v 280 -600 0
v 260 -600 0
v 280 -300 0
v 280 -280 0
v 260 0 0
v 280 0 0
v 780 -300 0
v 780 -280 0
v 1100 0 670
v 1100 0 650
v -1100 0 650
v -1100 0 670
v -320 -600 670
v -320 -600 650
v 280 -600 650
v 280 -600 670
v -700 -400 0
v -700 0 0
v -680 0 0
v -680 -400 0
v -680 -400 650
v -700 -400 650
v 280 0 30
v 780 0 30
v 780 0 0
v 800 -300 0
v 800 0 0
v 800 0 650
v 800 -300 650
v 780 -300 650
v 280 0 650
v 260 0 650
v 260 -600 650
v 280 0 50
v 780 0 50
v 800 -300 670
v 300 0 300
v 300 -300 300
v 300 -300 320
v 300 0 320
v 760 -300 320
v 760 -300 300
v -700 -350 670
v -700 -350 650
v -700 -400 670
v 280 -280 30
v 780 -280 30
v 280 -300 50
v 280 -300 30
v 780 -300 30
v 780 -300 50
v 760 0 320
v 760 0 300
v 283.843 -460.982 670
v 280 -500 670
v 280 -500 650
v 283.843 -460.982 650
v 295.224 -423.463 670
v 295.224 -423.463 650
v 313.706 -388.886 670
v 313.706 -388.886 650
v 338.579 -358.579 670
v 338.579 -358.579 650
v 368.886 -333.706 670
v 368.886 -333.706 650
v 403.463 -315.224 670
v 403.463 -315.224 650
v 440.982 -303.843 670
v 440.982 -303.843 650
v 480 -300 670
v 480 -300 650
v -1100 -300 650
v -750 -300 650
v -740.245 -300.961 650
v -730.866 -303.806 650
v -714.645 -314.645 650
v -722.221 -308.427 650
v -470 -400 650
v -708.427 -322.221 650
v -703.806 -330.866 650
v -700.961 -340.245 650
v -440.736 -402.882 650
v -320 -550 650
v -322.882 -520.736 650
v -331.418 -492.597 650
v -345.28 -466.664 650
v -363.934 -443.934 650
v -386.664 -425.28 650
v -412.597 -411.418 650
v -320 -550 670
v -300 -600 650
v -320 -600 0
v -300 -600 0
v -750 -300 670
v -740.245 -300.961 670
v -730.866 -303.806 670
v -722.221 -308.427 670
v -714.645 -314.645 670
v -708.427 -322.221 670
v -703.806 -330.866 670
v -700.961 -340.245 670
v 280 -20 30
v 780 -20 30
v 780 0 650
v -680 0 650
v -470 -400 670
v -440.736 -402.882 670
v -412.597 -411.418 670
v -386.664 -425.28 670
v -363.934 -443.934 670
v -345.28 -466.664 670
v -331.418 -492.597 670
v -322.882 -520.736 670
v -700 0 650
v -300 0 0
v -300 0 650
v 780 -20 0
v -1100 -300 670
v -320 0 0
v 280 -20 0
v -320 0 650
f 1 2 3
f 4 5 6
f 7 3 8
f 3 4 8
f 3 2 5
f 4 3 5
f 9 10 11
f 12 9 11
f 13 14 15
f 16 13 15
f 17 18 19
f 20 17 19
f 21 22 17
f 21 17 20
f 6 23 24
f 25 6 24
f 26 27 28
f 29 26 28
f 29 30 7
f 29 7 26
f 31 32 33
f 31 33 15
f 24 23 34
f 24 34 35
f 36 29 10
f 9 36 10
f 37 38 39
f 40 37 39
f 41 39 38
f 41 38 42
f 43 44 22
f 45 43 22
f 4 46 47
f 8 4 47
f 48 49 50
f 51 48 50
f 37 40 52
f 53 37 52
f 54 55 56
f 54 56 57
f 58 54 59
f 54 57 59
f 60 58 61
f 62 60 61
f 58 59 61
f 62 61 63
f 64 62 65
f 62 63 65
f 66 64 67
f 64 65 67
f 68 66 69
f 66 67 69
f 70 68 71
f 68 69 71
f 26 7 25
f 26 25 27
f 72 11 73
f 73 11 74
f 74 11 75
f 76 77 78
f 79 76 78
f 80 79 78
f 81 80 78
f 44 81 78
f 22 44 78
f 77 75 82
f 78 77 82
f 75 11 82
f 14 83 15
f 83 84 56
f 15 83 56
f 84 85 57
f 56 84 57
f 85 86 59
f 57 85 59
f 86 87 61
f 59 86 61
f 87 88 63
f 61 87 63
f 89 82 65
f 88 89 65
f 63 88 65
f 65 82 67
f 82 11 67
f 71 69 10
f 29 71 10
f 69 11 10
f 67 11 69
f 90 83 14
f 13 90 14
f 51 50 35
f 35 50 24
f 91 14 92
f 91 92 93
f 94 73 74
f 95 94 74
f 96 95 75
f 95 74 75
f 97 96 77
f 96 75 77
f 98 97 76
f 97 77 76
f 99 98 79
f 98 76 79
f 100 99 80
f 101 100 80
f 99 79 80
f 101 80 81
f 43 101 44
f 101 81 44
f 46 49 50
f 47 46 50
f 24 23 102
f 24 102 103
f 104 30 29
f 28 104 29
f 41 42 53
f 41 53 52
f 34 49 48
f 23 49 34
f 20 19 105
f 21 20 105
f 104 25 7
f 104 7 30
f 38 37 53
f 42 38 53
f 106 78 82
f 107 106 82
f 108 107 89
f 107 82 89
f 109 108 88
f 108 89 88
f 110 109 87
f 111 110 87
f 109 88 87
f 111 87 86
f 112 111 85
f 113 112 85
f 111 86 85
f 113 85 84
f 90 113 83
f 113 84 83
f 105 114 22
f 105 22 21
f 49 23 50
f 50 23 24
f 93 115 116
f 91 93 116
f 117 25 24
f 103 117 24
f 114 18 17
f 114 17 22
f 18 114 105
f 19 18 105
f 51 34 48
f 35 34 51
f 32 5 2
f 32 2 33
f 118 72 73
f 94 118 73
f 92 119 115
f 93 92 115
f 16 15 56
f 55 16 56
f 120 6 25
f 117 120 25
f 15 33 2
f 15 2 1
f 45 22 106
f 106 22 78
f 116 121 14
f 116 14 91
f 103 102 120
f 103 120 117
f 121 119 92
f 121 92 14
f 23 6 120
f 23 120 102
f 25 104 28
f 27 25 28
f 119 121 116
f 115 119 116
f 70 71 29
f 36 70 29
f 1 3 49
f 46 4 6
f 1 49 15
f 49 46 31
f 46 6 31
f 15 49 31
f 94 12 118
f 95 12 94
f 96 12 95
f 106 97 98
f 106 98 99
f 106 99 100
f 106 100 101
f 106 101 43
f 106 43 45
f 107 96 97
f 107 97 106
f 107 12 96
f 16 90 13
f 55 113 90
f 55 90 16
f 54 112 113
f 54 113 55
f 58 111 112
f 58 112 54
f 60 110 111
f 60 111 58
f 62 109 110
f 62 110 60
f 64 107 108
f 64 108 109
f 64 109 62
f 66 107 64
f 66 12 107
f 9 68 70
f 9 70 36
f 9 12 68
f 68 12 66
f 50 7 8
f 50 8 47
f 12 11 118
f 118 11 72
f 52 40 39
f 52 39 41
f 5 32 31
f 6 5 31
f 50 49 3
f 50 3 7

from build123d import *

# Parameters (mm, degrees)
F1_W      = 20
F1_H      = 650
F2_DEPTH  = 600
F3_W      = 20
F3_H      = 650
F4_DEPTH  = 400
F5_W      = 20
F5_H      = 650
F6_DEPTH  = 300
F8_DEPTH  = 20
F9_W      = 500
F9_H      = 30
F10_DEPTH = 20
F11_W     = 500
F11_H     = 30
F12_DEPTH = 20
F13_W     = 500
F13_H     = 300
F14_DEPTH = 20
F15_W     = 460
F15_H     = 20
F16_DEPTH = 300


with BuildPart() as f2:
    # F1 (on Front) → F2 (new body)
    with BuildSketch(Plane.XZ):
        with Locations((-310, 325)):
            Rectangle(F1_W, F1_H)
    extrude(amount=F2_DEPTH)


with BuildPart() as f2b:
    # F1 (on Front) → F2, piece 2 (new body)
    with BuildSketch(Plane.XZ):
        with Locations((270, 325)):
            Rectangle(F1_W, F1_H)
    extrude(amount=F2_DEPTH)

    # F11 (on face) → F12 (join)
    with BuildSketch(Plane.XZ.offset(300)):
        with Locations((530, 15)):
            Rectangle(F11_W, F11_H)
    extrude(amount=-F12_DEPTH)


with BuildPart() as f4:
    # F3 (on face) → F4 (new body)
    with BuildSketch(Plane.XZ):
        with Locations((-690, 325)):
            Rectangle(F3_W, F3_H)
    extrude(amount=F4_DEPTH)


with BuildPart() as f6:
    # F5 (on face) → F6 (new body)
    with BuildSketch(Plane.XZ):
        with Locations((790, 325)):
            Rectangle(F5_W, F5_H)
    extrude(amount=F6_DEPTH)


with BuildPart() as f8:
    # F7 (on face) → F8 (new body)
    with BuildSketch(Plane.XY.offset(650)):
        with BuildLine():
            Line((800, -300), (1100, 0))
            Line((1100, 0), (-1100, 0))
            Line((-1100, 0), (-1100, -300))
            Line((-1100, -300), (-750, -300))
            ThreePointArc((-750, -300), (-714.6446609407, -314.6446609407), (-700, -350))
            Line((-700, -350), (-700, -400))
            Line((-700, -400), (-470, -400))
            ThreePointArc((-470, -400), (-363.933982822, -443.933982822), (-320, -550))
            Line((-320, -550), (-320, -600))
            Line((-320, -600), (280, -600))
            Line((280, -600), (280, -500))
            ThreePointArc((280, -500), (338.5786437627, -358.5786437627), (480, -300))
            Line((480, -300), (800, -300))
        make_face()
    extrude(amount=F8_DEPTH)


with BuildPart() as f10:
    # F9 (on Front) → F10 (new body)
    with BuildSketch(Plane.XZ):
        with Locations((530, 15)):
            Rectangle(F9_W, F9_H)
    extrude(amount=F10_DEPTH)


with BuildPart() as f14:
    # F13 (on face) → F14 (new body)
    with BuildSketch(Plane.XY.offset(30)):
        with Locations((530, -150)):
            Rectangle(F13_W, F13_H)
    extrude(amount=F14_DEPTH)


with BuildPart() as f16:
    # F15 (on Front) → F16 (new body)
    with BuildSketch(Plane.XZ):
        with Locations((530, 310)):
            Rectangle(F15_W, F15_H)
    extrude(amount=F16_DEPTH)


solid = Compound([f2.part, f2b.part, f4.part, f6.part, f8.part, f10.part, f14.part, f16.part])
